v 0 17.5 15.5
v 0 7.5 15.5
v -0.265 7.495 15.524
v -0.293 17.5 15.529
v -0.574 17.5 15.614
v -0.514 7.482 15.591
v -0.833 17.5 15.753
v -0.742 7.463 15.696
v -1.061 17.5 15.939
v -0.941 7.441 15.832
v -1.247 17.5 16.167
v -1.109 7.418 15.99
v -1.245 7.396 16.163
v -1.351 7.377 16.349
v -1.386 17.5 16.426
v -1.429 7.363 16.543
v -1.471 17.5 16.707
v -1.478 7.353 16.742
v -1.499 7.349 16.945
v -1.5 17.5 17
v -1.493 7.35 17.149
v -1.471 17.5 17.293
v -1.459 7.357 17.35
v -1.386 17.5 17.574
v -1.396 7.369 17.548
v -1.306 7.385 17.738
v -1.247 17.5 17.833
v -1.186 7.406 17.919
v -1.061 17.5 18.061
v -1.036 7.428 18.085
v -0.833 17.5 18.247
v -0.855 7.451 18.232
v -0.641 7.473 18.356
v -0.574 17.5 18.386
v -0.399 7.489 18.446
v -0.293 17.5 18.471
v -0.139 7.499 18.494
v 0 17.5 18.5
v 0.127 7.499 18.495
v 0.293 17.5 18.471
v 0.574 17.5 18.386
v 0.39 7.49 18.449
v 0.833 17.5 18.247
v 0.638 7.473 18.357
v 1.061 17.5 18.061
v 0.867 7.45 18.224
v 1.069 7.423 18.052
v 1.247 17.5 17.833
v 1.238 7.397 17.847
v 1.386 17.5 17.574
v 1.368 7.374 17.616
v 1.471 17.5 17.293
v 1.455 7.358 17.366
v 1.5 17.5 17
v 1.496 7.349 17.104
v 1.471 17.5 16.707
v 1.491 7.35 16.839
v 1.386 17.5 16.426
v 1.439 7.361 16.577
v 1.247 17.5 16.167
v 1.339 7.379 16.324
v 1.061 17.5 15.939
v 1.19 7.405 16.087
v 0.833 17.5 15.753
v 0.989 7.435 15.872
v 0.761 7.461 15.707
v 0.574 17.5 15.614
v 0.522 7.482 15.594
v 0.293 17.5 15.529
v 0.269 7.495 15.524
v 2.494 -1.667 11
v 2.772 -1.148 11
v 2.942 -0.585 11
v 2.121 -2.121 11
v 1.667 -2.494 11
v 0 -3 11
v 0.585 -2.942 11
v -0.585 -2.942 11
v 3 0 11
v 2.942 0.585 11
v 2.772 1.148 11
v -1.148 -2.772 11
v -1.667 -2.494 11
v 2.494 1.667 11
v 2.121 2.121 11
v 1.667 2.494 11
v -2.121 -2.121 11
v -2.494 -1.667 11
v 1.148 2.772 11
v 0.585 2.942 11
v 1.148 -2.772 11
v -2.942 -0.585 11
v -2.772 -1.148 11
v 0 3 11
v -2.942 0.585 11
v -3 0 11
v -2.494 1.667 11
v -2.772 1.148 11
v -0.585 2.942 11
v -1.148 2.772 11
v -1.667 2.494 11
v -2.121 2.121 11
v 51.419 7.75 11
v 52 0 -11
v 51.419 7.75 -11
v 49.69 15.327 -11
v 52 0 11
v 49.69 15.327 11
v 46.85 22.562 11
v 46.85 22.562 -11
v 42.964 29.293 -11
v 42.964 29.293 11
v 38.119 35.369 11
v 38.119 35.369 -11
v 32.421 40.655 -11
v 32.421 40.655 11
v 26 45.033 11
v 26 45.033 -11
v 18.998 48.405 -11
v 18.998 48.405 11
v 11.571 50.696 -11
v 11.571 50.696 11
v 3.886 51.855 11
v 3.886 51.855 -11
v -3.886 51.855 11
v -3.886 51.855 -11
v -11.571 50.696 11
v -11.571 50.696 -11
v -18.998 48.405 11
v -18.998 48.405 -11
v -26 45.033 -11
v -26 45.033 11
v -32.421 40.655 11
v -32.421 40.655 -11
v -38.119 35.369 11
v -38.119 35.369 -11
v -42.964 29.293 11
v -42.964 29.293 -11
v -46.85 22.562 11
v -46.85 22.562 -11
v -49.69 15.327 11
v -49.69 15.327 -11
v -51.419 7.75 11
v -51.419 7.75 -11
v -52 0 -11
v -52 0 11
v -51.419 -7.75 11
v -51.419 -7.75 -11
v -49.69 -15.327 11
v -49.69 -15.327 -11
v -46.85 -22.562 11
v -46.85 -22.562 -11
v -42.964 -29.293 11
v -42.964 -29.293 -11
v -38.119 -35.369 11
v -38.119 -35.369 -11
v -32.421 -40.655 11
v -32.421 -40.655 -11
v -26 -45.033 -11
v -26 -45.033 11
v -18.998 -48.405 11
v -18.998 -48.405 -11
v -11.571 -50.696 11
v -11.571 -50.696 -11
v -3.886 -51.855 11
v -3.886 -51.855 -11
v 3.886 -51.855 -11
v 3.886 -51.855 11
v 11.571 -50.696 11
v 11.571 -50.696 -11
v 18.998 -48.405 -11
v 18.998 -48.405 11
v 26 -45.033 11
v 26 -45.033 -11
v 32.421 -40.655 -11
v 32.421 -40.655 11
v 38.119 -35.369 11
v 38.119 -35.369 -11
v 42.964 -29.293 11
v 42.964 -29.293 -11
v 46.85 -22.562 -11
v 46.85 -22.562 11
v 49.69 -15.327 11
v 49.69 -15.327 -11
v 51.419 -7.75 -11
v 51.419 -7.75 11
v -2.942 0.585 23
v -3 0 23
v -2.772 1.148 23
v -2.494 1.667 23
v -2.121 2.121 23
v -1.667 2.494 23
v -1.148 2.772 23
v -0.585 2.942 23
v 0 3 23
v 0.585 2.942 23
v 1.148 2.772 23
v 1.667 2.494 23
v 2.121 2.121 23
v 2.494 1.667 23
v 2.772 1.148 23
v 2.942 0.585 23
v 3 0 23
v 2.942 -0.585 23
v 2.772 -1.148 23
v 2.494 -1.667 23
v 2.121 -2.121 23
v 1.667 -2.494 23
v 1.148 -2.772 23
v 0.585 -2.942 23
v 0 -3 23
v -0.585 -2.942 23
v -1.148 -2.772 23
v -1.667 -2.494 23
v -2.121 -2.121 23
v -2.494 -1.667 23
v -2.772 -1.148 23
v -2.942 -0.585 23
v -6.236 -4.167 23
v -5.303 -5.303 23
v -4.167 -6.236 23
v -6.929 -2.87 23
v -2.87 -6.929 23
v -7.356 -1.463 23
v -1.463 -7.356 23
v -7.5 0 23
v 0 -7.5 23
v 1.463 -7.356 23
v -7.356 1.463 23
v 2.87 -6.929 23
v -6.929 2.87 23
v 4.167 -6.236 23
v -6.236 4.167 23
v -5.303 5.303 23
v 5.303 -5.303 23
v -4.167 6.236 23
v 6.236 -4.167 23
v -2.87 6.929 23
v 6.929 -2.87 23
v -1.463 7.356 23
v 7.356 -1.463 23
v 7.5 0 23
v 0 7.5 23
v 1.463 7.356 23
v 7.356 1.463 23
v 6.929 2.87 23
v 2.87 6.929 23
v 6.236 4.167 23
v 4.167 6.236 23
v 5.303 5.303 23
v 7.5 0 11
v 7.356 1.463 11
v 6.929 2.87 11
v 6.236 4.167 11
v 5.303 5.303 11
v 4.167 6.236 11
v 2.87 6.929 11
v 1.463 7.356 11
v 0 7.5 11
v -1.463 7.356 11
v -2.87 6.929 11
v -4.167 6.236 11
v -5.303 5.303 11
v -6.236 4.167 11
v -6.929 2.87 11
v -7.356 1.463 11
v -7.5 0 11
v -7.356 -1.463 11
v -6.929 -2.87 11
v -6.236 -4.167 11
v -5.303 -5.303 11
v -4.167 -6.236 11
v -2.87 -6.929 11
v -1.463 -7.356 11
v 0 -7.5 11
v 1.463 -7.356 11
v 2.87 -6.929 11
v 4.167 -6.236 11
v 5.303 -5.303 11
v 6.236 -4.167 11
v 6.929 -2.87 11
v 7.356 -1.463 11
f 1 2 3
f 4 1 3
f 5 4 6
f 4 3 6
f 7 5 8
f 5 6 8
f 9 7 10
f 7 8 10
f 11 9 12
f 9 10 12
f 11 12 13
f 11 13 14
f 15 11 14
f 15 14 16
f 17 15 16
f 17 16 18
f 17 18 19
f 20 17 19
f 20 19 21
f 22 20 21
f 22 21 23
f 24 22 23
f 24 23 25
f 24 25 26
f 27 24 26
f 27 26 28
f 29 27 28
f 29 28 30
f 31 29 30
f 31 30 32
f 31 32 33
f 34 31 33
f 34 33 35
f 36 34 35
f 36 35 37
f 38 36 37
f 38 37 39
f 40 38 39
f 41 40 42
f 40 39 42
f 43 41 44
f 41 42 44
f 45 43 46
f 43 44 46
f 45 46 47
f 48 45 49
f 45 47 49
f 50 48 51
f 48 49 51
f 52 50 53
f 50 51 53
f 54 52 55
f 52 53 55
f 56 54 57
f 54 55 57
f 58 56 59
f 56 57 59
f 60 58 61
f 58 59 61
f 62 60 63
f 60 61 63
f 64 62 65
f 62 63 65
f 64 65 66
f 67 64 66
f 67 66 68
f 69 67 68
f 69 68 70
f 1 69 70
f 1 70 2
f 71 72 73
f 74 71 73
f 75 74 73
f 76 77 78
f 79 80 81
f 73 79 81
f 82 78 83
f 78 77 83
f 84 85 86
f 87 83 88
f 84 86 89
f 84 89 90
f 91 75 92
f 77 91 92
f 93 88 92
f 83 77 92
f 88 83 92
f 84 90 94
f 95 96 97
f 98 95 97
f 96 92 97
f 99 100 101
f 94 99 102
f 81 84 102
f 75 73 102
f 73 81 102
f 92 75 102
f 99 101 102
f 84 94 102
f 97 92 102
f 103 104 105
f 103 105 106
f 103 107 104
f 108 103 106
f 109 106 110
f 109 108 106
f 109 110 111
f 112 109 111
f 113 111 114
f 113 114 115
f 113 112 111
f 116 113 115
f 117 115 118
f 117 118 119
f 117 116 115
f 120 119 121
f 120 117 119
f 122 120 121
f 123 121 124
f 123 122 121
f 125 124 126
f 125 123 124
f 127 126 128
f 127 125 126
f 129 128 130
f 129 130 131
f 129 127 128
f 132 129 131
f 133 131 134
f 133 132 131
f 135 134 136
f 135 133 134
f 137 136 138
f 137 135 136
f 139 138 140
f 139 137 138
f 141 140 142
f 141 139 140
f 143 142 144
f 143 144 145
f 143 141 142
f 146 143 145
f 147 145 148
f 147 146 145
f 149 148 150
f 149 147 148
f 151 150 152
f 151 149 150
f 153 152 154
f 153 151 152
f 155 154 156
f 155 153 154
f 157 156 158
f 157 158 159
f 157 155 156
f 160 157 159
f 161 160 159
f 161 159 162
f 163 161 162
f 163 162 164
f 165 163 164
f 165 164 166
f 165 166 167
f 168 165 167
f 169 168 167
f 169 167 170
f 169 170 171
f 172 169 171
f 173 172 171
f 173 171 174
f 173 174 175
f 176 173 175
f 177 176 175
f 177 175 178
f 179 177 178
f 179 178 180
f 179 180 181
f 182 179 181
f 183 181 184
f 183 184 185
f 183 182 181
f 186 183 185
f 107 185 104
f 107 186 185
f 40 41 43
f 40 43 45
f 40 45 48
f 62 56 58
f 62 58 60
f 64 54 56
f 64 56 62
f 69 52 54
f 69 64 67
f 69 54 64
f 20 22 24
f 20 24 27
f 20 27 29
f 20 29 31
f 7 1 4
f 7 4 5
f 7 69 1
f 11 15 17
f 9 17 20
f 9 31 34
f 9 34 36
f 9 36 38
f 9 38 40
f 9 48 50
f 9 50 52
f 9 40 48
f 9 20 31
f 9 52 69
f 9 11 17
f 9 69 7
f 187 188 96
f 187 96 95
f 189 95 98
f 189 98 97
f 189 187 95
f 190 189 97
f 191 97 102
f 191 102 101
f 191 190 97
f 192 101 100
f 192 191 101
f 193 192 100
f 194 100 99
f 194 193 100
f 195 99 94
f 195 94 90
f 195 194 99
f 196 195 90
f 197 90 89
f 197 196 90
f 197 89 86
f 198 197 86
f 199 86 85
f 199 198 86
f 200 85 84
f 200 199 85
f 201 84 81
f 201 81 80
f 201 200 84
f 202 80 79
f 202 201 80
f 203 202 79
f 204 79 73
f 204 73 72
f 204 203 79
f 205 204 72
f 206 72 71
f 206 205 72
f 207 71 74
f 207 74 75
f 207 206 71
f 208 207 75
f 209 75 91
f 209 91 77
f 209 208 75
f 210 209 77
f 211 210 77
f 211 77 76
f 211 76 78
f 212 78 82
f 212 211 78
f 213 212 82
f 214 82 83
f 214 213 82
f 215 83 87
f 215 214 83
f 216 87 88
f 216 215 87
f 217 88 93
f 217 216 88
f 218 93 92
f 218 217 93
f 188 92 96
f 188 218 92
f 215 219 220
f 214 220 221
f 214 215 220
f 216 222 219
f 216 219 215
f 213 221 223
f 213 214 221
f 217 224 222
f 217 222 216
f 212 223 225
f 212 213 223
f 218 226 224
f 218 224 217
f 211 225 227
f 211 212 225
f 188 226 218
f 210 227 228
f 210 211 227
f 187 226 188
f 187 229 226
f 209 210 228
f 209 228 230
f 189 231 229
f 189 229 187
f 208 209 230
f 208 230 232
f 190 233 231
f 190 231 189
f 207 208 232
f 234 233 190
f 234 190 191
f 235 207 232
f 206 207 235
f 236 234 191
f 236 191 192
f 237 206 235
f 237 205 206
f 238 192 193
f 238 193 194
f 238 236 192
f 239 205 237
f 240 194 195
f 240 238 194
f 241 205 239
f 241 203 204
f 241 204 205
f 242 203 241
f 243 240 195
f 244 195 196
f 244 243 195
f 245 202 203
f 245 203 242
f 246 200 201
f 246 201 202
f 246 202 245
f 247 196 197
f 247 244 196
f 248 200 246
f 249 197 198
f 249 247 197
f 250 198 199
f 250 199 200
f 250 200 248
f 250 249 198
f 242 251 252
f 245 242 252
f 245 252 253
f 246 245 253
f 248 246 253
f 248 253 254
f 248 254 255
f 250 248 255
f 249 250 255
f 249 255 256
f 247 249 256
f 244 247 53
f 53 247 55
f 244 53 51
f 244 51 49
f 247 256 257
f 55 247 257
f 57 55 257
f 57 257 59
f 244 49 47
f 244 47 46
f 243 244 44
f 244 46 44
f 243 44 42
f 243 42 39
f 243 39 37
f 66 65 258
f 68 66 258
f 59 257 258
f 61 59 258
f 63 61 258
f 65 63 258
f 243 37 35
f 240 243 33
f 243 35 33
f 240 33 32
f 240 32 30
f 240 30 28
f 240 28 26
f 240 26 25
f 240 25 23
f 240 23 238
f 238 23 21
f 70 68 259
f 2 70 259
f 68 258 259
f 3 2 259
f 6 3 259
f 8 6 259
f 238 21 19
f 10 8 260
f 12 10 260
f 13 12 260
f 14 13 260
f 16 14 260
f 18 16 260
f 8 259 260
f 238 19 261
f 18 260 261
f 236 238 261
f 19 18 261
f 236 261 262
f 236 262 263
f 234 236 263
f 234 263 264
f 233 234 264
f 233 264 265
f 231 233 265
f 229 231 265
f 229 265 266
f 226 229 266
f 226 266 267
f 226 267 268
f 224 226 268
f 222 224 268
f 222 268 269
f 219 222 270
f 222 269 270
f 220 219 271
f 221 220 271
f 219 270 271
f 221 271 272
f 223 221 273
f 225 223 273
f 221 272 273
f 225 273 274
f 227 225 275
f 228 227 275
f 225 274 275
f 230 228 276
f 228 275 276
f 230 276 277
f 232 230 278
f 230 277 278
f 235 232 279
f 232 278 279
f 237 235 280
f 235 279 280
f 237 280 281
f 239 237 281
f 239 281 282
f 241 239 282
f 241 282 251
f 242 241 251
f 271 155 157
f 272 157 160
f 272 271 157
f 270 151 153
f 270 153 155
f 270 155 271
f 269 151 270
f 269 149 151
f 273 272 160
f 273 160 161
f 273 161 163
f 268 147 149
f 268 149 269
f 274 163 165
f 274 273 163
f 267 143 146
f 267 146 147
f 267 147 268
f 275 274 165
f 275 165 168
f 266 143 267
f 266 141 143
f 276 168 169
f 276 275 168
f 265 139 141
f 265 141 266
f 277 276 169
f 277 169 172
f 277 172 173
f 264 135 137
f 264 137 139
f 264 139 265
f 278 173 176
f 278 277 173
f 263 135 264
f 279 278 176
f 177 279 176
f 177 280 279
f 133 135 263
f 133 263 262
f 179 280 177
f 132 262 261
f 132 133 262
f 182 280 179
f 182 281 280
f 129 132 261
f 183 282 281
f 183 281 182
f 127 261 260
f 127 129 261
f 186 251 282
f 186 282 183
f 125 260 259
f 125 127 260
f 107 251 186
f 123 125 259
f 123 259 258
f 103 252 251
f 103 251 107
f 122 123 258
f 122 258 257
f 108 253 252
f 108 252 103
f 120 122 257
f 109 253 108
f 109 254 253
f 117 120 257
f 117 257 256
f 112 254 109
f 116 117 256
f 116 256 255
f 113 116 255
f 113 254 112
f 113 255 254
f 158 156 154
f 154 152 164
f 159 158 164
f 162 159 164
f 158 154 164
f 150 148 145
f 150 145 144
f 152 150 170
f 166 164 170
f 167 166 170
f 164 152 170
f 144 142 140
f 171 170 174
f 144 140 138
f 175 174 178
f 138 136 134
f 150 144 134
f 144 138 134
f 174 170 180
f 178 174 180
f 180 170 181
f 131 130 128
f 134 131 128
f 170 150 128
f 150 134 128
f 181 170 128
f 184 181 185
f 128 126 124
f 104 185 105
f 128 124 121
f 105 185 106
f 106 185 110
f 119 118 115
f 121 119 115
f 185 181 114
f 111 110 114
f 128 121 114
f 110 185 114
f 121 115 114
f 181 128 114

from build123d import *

# Parameters (mm, degrees)
SKETCH1_R           = 52
BOSS_EXTRUDE1_DEPTH = 11
SKETCH2_R           = 7.5
BOSS_EXTRUDE2_DEPTH = 12
SKETCH3_R           = 1.5
BOSS_EXTRUDE3_DEPTH = 17.5
SKETCH4_R           = 3
CUT_EXTRUDE3_DEPTH  = 12


with BuildPart() as part:
    # Sketch1 → Boss-Extrude1 (new, symmetric)
    with BuildSketch(Plane.XY):
        Circle(SKETCH1_R)
    extrude(amount=BOSS_EXTRUDE1_DEPTH, both=True)

    # Sketch2 → Boss-Extrude2 (add)
    with BuildSketch(Plane.XY.offset(11)):
        Circle(SKETCH2_R)
    extrude(amount=BOSS_EXTRUDE2_DEPTH)

    # Sketch3 → Boss-Extrude3 (add)
    with BuildSketch(Plane(origin=(0, 0, 0), x_dir=(1, 0, 0), z_dir=(0, 1, 0))):
        with Locations(Location((0, -17, 0), (0, 0, 90))):
            Circle(SKETCH3_R)
    extrude(amount=BOSS_EXTRUDE3_DEPTH)

    # Sketch4 → Cut-Extrude3 (cut)
    with BuildSketch(Plane(origin=(0, 0, 23), x_dir=(-1, 0, 0), z_dir=(0, 0, -1))):
        Circle(SKETCH4_R)
    extrude(amount=CUT_EXTRUDE3_DEPTH, mode=Mode.SUBTRACT)


solid = part.part
